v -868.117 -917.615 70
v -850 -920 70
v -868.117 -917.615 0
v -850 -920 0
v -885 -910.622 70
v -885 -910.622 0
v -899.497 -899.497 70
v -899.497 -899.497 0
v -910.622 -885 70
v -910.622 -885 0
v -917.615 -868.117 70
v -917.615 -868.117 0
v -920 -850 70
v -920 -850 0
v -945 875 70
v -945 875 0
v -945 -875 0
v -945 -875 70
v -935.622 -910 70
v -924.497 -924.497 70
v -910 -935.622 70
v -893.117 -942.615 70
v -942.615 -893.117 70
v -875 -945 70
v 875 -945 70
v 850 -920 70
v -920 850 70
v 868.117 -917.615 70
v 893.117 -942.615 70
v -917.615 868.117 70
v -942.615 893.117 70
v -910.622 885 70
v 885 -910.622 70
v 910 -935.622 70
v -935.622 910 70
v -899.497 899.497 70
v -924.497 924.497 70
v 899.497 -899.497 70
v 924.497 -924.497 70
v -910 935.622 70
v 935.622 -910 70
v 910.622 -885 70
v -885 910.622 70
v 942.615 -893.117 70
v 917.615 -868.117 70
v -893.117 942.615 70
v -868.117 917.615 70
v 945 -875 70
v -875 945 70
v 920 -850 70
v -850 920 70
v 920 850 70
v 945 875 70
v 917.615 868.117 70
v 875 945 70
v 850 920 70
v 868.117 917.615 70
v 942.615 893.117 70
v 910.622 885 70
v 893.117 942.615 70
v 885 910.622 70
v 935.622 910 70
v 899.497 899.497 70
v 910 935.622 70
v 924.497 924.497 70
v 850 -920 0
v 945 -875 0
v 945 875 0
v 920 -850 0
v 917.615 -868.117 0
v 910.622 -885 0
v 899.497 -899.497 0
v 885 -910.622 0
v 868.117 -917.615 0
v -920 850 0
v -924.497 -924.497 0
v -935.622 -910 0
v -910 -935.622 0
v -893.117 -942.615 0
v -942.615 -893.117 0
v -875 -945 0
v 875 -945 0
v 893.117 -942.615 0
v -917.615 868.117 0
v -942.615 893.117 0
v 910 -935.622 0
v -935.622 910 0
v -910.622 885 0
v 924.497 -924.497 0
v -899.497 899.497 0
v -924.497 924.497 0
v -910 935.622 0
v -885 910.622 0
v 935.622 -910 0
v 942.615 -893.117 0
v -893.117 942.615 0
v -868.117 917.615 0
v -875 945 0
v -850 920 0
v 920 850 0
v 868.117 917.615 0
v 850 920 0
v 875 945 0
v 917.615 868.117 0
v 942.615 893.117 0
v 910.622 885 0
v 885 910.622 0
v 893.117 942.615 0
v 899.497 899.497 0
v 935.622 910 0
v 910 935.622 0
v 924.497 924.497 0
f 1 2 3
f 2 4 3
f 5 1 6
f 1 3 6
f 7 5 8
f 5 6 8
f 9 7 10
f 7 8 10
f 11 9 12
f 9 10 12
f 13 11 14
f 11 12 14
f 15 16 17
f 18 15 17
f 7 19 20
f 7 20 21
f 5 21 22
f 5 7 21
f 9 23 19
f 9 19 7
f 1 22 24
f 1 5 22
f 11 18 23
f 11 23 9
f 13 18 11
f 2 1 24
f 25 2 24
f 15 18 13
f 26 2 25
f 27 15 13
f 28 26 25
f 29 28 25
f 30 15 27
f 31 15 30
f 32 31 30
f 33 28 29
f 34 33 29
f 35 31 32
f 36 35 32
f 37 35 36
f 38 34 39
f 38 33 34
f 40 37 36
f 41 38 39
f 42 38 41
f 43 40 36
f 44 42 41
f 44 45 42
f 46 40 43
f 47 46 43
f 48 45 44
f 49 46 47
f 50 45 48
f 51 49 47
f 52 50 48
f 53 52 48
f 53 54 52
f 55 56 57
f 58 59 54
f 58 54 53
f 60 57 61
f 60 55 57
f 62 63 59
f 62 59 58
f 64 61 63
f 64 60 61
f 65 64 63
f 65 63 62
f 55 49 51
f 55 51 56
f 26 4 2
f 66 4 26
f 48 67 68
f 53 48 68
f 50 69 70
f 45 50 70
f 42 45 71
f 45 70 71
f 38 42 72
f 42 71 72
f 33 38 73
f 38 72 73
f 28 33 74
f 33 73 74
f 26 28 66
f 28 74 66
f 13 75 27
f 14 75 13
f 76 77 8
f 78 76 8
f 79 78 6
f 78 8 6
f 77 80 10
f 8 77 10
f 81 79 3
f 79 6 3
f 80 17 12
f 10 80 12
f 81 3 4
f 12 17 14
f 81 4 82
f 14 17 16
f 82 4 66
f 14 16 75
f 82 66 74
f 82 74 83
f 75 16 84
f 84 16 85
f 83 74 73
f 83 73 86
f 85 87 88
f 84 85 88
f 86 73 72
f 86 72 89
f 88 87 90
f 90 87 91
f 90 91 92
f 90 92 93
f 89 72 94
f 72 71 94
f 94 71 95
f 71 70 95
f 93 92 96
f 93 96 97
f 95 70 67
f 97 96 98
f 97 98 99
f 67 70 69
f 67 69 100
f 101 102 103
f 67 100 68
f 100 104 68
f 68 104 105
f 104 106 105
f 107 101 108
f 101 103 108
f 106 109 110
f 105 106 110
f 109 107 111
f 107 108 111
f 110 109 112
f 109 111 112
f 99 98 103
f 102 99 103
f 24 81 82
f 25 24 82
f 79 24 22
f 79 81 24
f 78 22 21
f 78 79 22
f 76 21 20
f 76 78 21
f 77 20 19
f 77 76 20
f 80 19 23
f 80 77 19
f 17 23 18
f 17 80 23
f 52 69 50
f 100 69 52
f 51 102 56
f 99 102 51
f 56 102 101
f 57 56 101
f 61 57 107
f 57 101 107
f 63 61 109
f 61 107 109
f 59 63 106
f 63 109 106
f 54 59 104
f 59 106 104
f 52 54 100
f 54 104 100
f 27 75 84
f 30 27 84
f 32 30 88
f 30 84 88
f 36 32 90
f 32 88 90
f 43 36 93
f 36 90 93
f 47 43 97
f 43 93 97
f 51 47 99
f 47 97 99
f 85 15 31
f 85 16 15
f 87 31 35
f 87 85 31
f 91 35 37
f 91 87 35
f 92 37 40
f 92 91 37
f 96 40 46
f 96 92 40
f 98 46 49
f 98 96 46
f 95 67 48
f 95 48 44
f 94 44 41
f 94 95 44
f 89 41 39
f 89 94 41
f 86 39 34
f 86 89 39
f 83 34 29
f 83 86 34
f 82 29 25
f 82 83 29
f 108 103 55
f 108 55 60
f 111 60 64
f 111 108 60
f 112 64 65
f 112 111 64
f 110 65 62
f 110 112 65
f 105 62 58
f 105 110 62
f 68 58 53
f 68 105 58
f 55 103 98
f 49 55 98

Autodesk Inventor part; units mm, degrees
ref_plane "YZ Plane" through (0, 0, 0) normal (1, 0, 0) x (0, 1, 0)
ref_plane "XZ Plane" through (0, 0, 0) normal (0, 1, 0) x (-1, 0, 0)
ref_plane "XY Plane" through (0, 0, 0) normal (0, 0, 1) x (1, 0, 0)
sketch "Sketch1" plane through (0, 0, 0) normal (0, 0, 1) x (1, 0, 0)
  line L0 (-875, -945) -> (875, -945)
  line L1 (945, -875) -> (945, 875)
  line L2 (875, 945) -> (-875, 945)
  line L3 (-945, 875) -> (-945, -875)
  line L4 (-945, -945) -> (945, 945) construction
  line L5 (945, -945) -> (-945, 945) construction
  line L6 (-850, -920) -> (850, -920)
  line L7 (920, -850) -> (920, 850)
  line L8 (850, 920) -> (-850, 920)
  line L9 (-920, 850) -> (-920, -850)
  line L10 (-920, -920) -> (920, 920) construction
  line L11 (920, -920) -> (-920, 920) construction
  arc A0 (-850, 920) -> (-920, 850) centre (-850, 850) ccw
  arc A1 (-875, 945) -> (-945, 875) centre (-875, 875) ccw
  arc A2 (920, 850) -> (850, 920) centre (850, 850) ccw
  arc A3 (945, 875) -> (875, 945) centre (875, 875) ccw
  arc A4 (850, -920) -> (920, -850) centre (850, -850) ccw
  arc A5 (875, -945) -> (945, -875) centre (875, -875) ccw
  arc A6 (-920, -850) -> (-850, -920) centre (-850, -850) ccw
  arc A7 (-945, -875) -> (-875, -945) centre (-875, -875) ccw
  point P0 (0, 0)
  dimension "d0" = 1890
  dimension "d1" = 1890
  dimension "d2" = 1840
  dimension "d3" = 1840
  dimension "d6" = 70
extrude "Extrusion1" add sketch "Sketch1" along normal blind 70
properties part number "Coil1or2"
